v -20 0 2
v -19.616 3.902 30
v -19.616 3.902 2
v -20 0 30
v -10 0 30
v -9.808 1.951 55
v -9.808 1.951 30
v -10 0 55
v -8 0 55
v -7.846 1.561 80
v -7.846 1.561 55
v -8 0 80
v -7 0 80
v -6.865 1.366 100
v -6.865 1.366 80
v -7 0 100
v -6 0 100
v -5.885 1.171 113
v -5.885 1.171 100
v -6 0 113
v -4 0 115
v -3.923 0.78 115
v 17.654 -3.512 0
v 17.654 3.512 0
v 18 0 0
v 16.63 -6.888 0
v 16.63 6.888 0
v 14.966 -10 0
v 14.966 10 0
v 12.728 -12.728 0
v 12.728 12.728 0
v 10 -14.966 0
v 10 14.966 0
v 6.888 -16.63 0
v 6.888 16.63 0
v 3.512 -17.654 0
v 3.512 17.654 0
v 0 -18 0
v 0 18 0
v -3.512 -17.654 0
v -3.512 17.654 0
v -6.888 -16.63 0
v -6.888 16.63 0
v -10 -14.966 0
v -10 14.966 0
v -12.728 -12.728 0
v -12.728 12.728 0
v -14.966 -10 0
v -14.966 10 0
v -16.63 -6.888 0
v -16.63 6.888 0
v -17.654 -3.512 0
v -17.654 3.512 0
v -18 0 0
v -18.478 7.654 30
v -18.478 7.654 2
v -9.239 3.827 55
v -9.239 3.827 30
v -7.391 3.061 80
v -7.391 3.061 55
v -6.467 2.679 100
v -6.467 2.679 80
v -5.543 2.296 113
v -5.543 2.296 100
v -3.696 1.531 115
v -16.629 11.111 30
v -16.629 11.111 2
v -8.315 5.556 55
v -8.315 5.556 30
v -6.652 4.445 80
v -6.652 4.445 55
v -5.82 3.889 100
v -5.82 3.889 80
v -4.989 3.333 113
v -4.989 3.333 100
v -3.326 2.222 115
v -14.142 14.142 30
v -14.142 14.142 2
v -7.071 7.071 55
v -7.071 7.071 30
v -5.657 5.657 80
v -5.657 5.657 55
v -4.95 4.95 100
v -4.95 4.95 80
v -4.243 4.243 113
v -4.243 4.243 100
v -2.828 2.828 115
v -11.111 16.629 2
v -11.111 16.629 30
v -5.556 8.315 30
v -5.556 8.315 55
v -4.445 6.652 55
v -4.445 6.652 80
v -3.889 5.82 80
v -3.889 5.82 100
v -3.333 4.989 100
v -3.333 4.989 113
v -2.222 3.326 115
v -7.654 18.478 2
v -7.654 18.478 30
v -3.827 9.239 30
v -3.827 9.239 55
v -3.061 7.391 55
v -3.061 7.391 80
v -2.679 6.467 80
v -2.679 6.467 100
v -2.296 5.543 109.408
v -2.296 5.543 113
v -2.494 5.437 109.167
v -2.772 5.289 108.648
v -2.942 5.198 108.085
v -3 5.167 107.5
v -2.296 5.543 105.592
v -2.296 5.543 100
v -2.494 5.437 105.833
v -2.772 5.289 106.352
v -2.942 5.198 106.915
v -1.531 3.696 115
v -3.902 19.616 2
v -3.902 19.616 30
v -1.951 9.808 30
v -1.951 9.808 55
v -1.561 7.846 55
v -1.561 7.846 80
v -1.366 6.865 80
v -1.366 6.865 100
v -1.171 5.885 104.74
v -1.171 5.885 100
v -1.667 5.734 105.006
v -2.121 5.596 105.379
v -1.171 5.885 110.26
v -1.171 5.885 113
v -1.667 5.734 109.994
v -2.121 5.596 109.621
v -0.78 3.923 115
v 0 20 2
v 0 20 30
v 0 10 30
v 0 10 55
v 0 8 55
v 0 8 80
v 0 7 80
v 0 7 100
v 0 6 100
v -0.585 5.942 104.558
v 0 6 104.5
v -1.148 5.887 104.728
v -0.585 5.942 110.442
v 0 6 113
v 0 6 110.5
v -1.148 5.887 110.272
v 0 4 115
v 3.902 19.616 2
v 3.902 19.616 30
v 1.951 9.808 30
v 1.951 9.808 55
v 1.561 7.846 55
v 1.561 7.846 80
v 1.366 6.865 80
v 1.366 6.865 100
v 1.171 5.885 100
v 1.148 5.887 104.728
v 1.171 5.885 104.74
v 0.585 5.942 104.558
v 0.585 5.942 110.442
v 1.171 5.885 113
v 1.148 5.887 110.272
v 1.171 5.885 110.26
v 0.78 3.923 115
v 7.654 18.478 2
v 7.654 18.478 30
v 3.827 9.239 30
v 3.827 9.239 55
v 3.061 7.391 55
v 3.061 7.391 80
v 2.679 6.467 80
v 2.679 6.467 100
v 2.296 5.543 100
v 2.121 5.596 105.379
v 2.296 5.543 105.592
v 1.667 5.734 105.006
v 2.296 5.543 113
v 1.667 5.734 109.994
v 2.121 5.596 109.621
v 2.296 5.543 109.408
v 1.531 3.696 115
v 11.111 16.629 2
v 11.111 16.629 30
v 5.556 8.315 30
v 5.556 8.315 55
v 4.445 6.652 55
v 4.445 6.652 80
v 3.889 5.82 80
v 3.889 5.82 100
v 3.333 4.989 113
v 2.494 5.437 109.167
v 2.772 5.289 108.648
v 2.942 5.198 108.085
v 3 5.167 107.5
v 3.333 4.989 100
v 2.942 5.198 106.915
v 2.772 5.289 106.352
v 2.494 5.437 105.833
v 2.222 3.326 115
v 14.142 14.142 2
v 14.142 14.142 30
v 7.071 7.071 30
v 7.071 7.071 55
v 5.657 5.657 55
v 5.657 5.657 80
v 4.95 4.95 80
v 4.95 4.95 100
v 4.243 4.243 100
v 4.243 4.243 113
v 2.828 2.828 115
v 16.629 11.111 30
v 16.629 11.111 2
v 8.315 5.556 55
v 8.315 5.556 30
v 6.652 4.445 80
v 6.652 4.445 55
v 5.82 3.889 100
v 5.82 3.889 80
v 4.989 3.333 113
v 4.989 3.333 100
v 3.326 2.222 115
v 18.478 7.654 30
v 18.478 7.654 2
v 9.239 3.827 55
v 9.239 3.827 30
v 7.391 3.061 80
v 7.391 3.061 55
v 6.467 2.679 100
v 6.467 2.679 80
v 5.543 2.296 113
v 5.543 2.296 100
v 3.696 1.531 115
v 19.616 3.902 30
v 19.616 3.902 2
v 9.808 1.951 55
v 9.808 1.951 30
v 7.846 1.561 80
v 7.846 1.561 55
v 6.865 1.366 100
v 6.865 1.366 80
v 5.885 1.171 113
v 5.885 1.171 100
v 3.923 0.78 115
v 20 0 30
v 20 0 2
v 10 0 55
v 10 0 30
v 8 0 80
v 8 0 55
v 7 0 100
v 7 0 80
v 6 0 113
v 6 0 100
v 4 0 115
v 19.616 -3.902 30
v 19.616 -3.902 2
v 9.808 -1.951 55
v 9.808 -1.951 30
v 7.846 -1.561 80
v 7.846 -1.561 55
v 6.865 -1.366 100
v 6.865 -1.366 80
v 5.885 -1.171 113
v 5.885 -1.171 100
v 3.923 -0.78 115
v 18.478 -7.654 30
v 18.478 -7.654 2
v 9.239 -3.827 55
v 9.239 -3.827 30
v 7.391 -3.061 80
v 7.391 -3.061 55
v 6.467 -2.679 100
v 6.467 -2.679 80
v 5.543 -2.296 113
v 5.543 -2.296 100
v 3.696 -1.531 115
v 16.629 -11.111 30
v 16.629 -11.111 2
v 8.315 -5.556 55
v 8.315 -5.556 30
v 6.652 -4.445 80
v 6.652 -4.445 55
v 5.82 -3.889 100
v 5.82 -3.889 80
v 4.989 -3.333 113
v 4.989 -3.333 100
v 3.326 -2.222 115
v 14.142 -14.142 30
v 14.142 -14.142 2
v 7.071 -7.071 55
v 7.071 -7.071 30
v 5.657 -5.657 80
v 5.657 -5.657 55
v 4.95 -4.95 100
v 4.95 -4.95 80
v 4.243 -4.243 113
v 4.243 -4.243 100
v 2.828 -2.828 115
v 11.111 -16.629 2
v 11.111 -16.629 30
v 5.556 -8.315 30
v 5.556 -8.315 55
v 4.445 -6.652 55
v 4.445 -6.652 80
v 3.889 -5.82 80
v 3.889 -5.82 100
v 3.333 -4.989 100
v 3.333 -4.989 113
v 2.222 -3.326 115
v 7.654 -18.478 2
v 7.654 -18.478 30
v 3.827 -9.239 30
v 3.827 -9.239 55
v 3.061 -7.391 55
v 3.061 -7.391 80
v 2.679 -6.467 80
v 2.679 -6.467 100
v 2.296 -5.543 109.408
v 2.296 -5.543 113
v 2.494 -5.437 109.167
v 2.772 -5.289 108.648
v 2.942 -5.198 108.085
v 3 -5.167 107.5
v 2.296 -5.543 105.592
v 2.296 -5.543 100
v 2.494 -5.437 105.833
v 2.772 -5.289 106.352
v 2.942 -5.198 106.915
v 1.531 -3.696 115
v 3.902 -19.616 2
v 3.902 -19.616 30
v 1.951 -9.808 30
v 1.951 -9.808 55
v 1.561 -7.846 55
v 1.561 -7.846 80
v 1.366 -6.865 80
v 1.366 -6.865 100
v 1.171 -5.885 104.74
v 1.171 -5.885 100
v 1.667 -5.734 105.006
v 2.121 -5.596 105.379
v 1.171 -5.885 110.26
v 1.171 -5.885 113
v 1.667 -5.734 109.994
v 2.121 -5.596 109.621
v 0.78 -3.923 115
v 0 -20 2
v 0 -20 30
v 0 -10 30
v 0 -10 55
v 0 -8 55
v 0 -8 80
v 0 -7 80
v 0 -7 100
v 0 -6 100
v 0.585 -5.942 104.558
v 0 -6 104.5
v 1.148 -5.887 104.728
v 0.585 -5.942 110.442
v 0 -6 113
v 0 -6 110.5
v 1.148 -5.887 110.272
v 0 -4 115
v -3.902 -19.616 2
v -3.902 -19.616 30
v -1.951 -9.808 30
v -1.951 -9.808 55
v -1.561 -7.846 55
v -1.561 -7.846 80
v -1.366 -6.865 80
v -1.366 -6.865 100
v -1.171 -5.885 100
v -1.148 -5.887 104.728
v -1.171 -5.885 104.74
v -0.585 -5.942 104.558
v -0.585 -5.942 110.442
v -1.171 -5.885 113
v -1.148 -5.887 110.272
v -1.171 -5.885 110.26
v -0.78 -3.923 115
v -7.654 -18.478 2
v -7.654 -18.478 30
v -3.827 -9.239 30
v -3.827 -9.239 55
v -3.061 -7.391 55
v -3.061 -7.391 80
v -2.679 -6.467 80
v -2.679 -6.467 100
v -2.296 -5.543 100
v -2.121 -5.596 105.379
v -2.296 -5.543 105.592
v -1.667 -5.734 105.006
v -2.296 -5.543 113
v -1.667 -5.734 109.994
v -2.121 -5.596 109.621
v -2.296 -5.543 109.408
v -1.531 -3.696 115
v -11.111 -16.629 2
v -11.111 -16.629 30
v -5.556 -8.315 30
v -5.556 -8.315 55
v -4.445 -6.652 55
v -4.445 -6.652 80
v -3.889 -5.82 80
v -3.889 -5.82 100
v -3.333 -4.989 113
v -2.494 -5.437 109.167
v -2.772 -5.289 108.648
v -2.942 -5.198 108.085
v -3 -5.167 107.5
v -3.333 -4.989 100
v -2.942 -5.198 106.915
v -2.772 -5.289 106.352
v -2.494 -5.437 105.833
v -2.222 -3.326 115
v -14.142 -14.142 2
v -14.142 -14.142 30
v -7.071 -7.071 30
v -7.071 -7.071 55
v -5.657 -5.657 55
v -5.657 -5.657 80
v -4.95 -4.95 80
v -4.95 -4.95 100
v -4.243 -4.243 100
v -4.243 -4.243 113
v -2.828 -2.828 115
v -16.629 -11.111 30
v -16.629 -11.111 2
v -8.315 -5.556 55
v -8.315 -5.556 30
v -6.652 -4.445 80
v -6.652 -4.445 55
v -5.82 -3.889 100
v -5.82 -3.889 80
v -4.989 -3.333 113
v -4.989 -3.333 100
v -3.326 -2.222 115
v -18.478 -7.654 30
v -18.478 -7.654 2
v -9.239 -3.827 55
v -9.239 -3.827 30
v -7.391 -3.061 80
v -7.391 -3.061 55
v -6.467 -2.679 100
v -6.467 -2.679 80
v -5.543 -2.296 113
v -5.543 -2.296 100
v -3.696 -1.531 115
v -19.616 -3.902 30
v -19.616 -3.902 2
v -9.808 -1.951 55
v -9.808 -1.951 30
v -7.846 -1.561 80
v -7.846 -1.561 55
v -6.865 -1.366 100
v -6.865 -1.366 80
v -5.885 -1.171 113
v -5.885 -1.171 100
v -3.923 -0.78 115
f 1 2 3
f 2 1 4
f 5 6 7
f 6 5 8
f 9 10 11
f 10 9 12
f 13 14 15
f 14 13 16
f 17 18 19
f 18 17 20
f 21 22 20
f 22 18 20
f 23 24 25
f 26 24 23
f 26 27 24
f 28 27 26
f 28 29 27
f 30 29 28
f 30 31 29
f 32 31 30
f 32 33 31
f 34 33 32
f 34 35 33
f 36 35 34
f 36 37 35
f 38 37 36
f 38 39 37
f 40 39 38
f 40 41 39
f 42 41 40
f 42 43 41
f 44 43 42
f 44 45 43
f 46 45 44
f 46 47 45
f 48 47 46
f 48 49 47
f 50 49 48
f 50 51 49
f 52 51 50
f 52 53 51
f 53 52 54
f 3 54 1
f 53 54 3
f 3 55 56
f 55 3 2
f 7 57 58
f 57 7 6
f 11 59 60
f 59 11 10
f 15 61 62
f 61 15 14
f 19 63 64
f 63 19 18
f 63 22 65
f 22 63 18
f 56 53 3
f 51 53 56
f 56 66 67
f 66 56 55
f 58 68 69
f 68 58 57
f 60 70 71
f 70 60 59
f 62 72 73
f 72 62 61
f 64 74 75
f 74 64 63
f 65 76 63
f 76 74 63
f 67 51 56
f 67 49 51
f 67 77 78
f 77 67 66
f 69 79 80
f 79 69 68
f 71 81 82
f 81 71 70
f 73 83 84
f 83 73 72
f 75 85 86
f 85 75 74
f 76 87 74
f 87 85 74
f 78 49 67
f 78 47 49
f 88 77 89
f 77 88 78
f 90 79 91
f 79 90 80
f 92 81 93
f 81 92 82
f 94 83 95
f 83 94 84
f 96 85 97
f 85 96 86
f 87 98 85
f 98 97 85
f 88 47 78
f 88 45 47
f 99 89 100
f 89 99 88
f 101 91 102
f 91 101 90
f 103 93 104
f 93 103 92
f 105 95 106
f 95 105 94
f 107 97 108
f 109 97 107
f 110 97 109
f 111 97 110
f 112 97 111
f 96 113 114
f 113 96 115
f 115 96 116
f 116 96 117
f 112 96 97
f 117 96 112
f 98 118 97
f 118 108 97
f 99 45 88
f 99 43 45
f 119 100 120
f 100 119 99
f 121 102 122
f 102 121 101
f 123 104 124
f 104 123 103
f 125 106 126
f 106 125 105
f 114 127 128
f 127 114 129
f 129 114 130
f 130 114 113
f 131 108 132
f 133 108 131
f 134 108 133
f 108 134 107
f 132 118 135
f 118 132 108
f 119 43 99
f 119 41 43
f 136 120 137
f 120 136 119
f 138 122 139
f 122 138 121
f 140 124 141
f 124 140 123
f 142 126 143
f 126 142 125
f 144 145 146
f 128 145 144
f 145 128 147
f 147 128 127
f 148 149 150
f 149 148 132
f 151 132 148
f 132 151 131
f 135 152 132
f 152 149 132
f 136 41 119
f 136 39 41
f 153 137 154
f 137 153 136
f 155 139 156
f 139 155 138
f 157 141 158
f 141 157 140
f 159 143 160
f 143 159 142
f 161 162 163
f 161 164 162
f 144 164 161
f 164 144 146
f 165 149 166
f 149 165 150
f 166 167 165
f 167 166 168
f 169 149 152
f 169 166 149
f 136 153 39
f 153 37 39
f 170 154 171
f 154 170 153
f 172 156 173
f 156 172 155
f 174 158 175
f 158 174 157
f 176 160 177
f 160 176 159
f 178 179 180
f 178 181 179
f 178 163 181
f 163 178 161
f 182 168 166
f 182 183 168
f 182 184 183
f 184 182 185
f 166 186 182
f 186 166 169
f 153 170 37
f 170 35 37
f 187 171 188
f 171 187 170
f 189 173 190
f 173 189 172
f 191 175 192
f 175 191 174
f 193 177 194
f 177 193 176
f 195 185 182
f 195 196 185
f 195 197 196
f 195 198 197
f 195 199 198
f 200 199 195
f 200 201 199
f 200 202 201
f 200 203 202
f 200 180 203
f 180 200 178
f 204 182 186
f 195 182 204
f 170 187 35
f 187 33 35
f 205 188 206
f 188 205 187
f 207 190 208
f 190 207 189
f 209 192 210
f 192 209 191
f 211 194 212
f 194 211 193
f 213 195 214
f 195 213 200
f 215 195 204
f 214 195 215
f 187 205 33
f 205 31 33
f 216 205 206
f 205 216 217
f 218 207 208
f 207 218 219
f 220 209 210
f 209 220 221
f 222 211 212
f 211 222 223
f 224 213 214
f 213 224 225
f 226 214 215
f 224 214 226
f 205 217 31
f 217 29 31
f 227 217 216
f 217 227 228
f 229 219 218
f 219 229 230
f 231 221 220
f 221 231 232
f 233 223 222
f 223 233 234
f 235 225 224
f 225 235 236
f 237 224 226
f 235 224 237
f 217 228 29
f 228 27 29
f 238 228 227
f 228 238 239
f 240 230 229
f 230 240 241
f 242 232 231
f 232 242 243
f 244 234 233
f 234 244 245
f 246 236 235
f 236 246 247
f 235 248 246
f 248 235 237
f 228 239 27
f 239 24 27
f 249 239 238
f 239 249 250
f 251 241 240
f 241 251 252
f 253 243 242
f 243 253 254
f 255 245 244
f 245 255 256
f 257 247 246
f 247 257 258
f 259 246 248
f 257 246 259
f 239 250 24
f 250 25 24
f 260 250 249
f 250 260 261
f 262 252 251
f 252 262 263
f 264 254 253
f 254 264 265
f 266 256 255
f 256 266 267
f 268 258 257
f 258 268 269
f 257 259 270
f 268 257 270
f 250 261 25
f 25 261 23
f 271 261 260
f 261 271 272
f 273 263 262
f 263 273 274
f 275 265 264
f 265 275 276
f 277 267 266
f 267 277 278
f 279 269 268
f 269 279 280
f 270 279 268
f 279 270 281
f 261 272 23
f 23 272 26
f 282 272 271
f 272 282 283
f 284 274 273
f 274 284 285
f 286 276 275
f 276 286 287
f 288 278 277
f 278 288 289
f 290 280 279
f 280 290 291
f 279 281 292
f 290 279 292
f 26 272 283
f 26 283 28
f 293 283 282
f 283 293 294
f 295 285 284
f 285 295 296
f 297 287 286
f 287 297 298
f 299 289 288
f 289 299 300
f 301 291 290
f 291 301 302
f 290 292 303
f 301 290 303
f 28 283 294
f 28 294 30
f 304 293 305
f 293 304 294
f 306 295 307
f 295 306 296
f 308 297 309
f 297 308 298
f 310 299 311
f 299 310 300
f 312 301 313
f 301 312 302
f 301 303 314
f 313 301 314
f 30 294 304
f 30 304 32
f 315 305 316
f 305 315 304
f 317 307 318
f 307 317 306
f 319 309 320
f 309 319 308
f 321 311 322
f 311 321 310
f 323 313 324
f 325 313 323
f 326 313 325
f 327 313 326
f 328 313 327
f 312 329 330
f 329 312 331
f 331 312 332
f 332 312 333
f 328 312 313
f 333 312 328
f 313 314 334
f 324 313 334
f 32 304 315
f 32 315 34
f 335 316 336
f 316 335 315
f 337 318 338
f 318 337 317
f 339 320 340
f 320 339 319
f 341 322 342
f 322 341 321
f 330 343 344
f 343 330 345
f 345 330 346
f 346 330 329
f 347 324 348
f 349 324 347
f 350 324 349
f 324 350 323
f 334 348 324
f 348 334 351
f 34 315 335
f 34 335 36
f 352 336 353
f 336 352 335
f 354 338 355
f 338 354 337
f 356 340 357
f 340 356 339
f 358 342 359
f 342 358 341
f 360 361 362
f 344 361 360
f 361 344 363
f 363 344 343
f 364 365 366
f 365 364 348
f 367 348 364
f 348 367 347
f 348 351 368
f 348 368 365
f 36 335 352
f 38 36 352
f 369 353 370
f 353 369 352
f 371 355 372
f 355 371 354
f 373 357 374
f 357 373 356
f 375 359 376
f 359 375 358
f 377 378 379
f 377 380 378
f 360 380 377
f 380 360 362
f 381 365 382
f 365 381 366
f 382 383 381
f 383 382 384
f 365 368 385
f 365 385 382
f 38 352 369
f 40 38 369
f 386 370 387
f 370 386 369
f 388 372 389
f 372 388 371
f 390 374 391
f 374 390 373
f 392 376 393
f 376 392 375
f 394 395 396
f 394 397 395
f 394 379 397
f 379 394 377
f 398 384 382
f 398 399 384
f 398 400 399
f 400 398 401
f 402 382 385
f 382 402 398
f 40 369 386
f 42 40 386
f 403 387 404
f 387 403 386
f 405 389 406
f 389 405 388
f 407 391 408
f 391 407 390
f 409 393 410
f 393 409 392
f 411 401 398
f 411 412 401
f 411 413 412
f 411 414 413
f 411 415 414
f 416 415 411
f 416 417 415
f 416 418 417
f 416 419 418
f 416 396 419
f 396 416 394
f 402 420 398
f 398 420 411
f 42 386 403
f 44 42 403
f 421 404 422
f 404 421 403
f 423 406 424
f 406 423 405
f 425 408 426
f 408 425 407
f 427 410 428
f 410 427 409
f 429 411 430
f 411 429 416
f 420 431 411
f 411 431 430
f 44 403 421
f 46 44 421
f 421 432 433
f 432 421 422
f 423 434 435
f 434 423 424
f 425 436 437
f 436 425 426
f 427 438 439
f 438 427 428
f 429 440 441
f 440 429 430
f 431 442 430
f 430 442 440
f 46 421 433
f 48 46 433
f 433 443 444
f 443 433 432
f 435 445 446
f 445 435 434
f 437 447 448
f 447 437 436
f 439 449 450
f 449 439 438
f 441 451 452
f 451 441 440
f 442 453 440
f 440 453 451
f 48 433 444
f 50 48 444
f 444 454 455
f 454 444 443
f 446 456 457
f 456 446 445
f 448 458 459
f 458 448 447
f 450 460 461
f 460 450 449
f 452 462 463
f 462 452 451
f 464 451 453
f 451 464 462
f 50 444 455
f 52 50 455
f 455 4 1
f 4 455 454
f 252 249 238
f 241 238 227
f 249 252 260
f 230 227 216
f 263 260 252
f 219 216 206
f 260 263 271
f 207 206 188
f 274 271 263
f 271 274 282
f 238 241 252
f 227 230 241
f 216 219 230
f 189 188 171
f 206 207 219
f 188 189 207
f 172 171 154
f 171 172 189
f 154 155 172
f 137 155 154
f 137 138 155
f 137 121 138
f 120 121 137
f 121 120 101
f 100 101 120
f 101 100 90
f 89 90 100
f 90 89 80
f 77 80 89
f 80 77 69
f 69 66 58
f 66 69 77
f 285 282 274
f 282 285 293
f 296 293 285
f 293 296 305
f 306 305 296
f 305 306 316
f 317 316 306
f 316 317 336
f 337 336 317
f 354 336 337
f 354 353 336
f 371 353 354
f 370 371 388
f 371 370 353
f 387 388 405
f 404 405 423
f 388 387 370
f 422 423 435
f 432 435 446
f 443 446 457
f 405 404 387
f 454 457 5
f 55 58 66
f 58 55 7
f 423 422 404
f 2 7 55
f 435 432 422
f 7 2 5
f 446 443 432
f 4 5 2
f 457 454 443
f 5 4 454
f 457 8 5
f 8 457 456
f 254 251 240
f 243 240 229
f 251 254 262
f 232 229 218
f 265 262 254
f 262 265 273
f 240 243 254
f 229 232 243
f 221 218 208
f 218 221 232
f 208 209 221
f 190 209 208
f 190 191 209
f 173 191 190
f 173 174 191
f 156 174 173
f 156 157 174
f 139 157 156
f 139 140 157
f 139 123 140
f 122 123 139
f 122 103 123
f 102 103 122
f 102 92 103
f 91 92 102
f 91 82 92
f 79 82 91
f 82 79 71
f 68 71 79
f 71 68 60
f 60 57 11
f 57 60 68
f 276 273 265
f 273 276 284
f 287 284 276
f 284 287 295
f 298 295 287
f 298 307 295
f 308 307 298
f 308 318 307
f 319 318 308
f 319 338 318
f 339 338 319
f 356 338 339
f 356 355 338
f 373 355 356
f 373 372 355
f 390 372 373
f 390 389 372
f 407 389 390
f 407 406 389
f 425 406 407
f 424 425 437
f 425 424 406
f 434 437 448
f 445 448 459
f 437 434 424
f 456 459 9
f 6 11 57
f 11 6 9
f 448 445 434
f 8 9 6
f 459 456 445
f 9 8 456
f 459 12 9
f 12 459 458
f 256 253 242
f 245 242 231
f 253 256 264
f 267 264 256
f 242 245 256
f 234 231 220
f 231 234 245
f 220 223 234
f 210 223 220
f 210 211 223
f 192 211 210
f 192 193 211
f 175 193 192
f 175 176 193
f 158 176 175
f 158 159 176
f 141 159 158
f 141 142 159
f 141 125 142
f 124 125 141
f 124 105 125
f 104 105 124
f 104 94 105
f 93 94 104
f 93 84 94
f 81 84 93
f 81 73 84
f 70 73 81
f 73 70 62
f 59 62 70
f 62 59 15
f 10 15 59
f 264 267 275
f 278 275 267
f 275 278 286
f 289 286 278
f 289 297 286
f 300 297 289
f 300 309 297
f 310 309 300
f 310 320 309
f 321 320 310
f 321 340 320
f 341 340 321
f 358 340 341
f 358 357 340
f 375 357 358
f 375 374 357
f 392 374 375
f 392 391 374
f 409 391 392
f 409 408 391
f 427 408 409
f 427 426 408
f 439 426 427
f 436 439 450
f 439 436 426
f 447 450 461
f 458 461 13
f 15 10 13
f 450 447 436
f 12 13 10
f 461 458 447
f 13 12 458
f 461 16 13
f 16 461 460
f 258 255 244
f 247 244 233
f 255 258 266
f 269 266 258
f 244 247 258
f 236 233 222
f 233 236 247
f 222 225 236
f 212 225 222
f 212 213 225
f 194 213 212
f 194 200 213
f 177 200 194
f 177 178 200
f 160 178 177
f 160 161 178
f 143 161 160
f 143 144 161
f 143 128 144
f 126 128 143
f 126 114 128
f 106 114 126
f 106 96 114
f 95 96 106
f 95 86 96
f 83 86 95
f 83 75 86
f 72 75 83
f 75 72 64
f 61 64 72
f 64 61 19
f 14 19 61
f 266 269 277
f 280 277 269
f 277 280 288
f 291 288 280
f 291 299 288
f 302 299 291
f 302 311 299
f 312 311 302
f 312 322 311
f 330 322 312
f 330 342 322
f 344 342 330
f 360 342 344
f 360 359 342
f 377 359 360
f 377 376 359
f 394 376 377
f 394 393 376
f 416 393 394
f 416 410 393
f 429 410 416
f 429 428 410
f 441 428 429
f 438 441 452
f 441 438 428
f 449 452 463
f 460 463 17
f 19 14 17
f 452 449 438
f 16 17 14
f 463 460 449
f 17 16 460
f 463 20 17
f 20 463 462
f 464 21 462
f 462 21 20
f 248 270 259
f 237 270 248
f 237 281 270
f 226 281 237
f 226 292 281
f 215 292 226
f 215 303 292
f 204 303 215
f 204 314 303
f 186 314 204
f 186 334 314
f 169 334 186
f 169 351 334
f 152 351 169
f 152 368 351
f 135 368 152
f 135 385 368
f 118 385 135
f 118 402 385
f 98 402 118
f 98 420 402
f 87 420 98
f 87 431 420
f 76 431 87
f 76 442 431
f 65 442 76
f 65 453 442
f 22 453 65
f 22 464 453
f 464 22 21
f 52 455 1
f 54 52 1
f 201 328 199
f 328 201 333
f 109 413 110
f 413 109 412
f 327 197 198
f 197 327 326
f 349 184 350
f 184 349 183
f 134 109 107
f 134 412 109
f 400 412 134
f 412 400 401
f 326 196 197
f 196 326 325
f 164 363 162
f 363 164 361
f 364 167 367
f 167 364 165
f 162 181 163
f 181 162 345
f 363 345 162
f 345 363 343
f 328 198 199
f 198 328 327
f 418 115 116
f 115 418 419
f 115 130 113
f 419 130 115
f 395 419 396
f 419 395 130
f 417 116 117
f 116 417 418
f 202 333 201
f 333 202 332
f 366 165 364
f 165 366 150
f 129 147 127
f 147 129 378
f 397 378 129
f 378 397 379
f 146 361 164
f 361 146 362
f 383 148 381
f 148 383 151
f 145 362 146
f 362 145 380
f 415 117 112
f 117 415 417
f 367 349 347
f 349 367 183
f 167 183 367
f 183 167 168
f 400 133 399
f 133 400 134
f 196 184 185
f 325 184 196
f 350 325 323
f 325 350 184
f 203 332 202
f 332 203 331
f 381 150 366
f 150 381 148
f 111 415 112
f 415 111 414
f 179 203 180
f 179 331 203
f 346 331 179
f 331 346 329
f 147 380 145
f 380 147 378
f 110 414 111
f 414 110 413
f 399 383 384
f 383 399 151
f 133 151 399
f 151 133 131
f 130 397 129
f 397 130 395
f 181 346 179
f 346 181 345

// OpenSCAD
$fn = 32;

// ----------------------------------------------------------------------
// Stepped shaft: diameters 40, 20, 16, 14, 12 mm, 115 mm long
// ----------------------------------------------------------------------

// --- parameters (mm) ---
d1 = 40;                  // step 1 diameter
len1 = 30;                // step 1 length
d2 = 20;                  // step 2 diameter
len2 = 25;                // step 2 length
d3 = 16;                  // step 3 diameter
len3 = 25;                // step 3 length
d4 = 14;                  // step 4 diameter
len4 = 20;                // step 4 length
d5 = 12;                  // step 5 diameter
len5 = 15;                // step 5 length
total = 115;              // overall length
chamfer = 2;              // end chamfer
cross_d = 6;              // cross pin hole
cross_z = 107.5;          // cross hole position

/* closed turning profile: x is the radius, y is the length */
profile = [[0, 0], [20 - chamfer, 0], [20, chamfer], [20, 30], [10, 30], [10, 55], [8, 55], [8, 80], [7, 80], [7, 100], [6, 100], [6, 113], [4, 115], [0, 115]];

difference() {
  rotate_extrude() polygon(profile);
  /* cross pin hole through the small step */
  translate([0, 0, cross_z]) rotate([90, 0, 0]) cylinder(h = d5 + 4, d = cross_d, center = true);
}
